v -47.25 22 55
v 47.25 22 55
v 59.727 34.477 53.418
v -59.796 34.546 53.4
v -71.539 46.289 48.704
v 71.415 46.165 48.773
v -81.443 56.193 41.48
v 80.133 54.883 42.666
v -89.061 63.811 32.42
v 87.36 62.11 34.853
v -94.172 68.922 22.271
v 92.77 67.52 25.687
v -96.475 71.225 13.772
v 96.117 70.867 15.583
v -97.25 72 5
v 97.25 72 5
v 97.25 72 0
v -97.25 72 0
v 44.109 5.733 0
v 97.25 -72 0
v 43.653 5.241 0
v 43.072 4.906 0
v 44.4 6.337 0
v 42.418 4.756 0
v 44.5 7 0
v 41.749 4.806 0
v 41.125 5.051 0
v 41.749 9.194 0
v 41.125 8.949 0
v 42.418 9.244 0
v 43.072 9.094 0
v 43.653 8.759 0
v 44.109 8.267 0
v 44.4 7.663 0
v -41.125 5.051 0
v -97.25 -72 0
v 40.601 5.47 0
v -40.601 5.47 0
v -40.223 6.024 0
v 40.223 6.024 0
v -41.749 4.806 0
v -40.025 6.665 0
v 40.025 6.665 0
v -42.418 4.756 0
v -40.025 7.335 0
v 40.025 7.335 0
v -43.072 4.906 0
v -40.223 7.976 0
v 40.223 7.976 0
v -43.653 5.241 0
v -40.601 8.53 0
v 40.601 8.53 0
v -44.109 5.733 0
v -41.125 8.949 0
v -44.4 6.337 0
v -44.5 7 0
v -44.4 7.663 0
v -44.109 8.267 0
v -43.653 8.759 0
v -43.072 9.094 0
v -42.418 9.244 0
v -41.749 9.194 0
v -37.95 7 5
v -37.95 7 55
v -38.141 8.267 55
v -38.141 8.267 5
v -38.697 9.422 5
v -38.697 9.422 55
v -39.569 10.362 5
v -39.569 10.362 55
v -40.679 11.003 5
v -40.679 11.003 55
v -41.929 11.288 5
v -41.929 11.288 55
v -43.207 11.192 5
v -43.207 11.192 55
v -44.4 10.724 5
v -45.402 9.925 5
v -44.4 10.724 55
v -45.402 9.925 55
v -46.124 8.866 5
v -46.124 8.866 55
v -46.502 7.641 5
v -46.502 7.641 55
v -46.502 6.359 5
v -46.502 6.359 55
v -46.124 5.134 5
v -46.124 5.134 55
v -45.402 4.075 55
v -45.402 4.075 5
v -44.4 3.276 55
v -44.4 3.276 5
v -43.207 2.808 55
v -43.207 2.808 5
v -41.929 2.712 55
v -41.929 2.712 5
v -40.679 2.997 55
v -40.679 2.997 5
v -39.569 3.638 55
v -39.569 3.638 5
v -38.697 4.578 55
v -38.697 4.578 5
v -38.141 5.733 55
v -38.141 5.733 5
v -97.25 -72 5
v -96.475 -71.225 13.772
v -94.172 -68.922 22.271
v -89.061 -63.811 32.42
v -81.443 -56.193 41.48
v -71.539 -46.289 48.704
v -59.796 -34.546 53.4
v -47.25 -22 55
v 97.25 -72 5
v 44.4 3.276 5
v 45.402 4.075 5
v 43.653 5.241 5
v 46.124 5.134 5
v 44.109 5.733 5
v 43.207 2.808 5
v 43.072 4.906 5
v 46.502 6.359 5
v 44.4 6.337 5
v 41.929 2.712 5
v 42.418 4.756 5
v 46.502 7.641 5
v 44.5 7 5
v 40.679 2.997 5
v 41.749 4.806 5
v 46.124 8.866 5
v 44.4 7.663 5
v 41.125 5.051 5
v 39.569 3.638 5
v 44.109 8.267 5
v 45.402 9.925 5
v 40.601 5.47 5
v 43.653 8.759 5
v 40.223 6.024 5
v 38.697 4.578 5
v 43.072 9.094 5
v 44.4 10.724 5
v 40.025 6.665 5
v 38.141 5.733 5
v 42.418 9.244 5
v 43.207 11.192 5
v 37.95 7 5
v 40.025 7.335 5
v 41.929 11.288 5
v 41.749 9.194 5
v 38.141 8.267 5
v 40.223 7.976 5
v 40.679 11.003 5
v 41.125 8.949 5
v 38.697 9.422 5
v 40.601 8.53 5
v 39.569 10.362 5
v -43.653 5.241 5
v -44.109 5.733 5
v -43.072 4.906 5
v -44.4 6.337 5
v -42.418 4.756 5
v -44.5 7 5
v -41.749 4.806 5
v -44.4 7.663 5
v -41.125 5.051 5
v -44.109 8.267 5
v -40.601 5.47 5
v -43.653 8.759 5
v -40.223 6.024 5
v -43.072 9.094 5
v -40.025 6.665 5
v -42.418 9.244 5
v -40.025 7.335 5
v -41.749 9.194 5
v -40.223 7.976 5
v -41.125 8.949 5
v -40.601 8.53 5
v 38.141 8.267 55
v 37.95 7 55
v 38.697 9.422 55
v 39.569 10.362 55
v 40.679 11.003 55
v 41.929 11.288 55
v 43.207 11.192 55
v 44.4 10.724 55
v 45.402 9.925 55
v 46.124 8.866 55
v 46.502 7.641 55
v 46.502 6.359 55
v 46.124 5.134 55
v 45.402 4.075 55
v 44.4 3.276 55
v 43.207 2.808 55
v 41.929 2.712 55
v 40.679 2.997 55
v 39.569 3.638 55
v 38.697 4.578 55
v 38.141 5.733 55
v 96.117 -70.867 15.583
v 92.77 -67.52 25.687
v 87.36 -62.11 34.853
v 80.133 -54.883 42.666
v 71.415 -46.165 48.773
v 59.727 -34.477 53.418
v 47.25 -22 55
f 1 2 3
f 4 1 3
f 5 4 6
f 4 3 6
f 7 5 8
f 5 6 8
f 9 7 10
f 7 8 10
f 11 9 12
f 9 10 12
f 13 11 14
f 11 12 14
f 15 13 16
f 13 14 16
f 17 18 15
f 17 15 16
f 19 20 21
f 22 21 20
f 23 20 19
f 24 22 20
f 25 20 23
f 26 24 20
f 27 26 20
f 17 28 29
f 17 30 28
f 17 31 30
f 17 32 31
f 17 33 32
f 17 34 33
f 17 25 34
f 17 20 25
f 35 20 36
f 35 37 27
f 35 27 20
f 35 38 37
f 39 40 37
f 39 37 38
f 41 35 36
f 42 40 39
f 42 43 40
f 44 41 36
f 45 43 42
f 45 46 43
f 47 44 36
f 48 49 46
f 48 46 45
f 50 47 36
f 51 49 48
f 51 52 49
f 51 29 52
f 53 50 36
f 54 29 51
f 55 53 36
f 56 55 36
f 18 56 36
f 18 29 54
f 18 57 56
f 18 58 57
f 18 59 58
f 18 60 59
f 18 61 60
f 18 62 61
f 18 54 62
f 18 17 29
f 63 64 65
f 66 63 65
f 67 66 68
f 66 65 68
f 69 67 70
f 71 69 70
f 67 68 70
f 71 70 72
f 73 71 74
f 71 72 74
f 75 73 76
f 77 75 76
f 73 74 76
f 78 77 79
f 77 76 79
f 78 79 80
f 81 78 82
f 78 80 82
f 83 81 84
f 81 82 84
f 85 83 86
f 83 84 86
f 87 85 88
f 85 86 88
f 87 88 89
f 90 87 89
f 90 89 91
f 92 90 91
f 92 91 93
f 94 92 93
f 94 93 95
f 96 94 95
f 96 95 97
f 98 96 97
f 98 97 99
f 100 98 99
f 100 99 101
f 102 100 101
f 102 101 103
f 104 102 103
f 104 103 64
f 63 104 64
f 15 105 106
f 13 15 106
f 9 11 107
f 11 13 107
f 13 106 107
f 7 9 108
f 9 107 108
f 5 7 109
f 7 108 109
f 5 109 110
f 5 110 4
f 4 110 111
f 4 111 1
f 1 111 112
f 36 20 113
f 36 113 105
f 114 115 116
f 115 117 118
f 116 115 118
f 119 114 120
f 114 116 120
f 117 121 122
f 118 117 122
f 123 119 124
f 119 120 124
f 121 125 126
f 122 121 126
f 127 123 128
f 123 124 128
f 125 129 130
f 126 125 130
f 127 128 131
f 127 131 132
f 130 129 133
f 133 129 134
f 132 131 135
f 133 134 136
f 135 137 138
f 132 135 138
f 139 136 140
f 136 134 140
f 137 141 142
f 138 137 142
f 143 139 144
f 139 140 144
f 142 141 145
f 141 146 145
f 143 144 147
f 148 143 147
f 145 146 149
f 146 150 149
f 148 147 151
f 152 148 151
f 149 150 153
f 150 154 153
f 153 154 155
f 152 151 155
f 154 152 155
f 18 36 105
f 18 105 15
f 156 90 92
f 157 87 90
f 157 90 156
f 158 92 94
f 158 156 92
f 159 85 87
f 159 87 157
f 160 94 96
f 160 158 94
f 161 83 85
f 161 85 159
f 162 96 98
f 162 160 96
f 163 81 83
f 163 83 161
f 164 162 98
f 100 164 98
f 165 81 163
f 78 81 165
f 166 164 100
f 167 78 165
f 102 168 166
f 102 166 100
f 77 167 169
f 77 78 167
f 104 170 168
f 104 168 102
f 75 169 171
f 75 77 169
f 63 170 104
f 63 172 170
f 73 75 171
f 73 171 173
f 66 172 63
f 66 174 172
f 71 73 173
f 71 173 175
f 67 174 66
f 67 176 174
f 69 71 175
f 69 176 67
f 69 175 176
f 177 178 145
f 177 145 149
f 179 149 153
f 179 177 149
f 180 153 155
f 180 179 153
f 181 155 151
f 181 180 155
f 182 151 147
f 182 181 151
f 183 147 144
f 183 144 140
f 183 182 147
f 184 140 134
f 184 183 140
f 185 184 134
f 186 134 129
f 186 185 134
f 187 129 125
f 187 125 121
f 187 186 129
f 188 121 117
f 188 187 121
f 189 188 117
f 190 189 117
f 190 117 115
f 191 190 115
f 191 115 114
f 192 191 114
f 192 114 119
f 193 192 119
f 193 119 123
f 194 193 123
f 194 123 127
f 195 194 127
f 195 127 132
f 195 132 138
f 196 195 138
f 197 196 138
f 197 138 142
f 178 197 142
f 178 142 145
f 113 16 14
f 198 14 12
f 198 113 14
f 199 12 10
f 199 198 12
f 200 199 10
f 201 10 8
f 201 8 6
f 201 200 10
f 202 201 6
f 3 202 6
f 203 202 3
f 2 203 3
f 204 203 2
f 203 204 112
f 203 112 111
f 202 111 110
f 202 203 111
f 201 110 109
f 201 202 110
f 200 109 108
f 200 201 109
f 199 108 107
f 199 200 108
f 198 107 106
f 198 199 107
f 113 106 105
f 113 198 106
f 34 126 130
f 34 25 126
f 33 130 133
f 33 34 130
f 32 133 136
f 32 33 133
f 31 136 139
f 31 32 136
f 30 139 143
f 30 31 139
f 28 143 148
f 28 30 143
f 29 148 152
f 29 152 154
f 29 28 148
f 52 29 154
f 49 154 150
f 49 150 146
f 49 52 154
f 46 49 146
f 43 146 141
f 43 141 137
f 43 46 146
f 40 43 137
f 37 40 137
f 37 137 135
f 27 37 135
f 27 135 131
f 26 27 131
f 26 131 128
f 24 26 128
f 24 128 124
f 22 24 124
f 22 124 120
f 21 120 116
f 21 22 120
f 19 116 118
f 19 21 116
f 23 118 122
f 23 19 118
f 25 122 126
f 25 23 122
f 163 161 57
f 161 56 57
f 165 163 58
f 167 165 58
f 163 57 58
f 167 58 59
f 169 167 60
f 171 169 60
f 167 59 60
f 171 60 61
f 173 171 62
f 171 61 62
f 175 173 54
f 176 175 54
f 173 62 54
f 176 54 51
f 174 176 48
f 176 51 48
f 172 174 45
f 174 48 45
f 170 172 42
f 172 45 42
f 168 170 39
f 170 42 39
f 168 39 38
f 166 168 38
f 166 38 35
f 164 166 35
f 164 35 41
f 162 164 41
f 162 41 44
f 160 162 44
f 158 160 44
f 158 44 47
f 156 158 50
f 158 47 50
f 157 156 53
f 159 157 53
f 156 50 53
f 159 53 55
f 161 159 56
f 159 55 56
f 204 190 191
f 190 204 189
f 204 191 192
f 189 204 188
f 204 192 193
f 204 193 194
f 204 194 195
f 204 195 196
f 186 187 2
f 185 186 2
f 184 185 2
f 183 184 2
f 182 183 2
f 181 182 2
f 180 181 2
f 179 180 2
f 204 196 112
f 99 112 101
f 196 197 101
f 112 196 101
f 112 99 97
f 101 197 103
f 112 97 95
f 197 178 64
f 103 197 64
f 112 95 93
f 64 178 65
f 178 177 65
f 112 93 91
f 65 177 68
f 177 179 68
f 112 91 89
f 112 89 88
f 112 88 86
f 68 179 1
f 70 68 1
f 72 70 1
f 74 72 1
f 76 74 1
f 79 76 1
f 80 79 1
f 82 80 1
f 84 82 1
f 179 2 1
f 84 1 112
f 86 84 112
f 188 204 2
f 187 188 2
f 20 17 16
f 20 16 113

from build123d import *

# Parameters (mm, degrees)
AUFSATZ_LINEAR_AUSTRAGEN1_DEPTH                     = 55
SCHNITT_LINEAR_AUSTRAGEN1_DEPTH                     = 183.25960194184557
SCHNITT_LINEAR_AUSTRAGEN2_DEPTH                     = 215.5675884191273
STIRNSENKUNG_F_R_M4_SENKSCHRAUBE_KOPF_B_D           = 4.5
STIRNSENKUNG_F_R_M4_SENKSCHRAUBE_KOPF_B_CBORE_D     = 8.6
STIRNSENKUNG_F_R_M4_SENKSCHRAUBE_KOPF_B_CBORE_DEPTH = 50


with BuildPart() as part:
    # Skizze2 → Aufsatz-Linear austragen1 (new body)
    with BuildSketch(Plane.XY):
        Polygon((97.25, -71.99999999999999), (-97.25, -72.00000000000001), (-97.25, 72), (97.25, 72.00000000000001), align=None)
    extrude(amount=AUFSATZ_LINEAR_AUSTRAGEN1_DEPTH)

    # Skizze3 → Schnitt-Linear austragen1 (cut, through all)
    with BuildSketch(Plane.XZ.offset(72)):
        with BuildLine():
            Line((-47.250000000000014, 54.99999999999999), (-31.187648825052438, 55))
            Line((-31.187648825052438, 55), (-49.06524576519668, 93.49392426446363))
            Line((-49.06524576519668, 93.49392426446363), (-152.6979191152644, 34.404714288264984))
            Line((-152.6979191152644, 34.404714288264984), (-97.25000000000001, -29.09207494836323))
            Line((-97.25000000000001, -29.09207494836323), (-97.25, 4.99999999999999))
            ThreePointArc((-97.25, 4.99999999999999), (-82.60533905932738, 40.35533905932737), (-47.250000000000014, 54.99999999999999))
        make_face()
    schnitt_linear_austragen1 = extrude(amount=-SCHNITT_LINEAR_AUSTRAGEN1_DEPTH, mode=Mode.SUBTRACT)

    # Spiegeln3: Schnitt-Linear austragen1 across plane
    add(schnitt_linear_austragen1.mirror(Plane(origin=(0, 0, 0), x_dir=(0, 0, 1), z_dir=(1, 0, 0))), mode=Mode.SUBTRACT)

    # Skizze6 → Schnitt-Linear austragen2 (cut, through all)
    with BuildSketch(Plane(origin=(97.25, 0, 0), x_dir=(0, 0, -1), z_dir=(1, 0, 0))):
        with BuildLine():
            Line((-4.999999999999997, 72.00000000000001), (11.062351174947562, 72.00000000000003))
            Line((11.062351174947562, 72.00000000000003), (-41.4687477452512, 93.52582627901205))
            Line((-41.4687477452512, 93.52582627901205), (-130.24502976788665, 42.907423802585875))
            Line((-130.24502976788665, 42.907423802585875), (-54.99999999999999, -43.260242586178926))
            Line((-54.99999999999999, -43.260242586178926), (-55, 22))
            ThreePointArc((-55, 22), (-40.35533905932737, 57.35533905932739), (-4.999999999999997, 72.00000000000001))
        make_face()
    schnitt_linear_austragen2 = extrude(amount=-SCHNITT_LINEAR_AUSTRAGEN2_DEPTH, mode=Mode.SUBTRACT)

    # Spiegeln4: Schnitt-Linear austragen2 across plane
    add(schnitt_linear_austragen2.mirror(Plane.ZX), mode=Mode.SUBTRACT)

    # Stirnsenkung für M4 Senkschraube (Kopf Button)1 (through all)
    with Locations(Plane.XY.offset(55)):
        with Locations((-42.25, 7)):
            stirnsenkung_f_r_m4_senkschraube_kopf_b = CounterBoreHole(STIRNSENKUNG_F_R_M4_SENKSCHRAUBE_KOPF_B_D / 2, STIRNSENKUNG_F_R_M4_SENKSCHRAUBE_KOPF_B_CBORE_D / 2, STIRNSENKUNG_F_R_M4_SENKSCHRAUBE_KOPF_B_CBORE_DEPTH)

    # Spiegeln5: Stirnsenkung für M4 Senkschraube (Kopf Button)1 across plane
    add(stirnsenkung_f_r_m4_senkschraube_kopf_b.mirror(Plane(origin=(0, 0, 0), x_dir=(0, 0, 1), z_dir=(1, 0, 0))), mode=Mode.SUBTRACT)


solid = part.part
